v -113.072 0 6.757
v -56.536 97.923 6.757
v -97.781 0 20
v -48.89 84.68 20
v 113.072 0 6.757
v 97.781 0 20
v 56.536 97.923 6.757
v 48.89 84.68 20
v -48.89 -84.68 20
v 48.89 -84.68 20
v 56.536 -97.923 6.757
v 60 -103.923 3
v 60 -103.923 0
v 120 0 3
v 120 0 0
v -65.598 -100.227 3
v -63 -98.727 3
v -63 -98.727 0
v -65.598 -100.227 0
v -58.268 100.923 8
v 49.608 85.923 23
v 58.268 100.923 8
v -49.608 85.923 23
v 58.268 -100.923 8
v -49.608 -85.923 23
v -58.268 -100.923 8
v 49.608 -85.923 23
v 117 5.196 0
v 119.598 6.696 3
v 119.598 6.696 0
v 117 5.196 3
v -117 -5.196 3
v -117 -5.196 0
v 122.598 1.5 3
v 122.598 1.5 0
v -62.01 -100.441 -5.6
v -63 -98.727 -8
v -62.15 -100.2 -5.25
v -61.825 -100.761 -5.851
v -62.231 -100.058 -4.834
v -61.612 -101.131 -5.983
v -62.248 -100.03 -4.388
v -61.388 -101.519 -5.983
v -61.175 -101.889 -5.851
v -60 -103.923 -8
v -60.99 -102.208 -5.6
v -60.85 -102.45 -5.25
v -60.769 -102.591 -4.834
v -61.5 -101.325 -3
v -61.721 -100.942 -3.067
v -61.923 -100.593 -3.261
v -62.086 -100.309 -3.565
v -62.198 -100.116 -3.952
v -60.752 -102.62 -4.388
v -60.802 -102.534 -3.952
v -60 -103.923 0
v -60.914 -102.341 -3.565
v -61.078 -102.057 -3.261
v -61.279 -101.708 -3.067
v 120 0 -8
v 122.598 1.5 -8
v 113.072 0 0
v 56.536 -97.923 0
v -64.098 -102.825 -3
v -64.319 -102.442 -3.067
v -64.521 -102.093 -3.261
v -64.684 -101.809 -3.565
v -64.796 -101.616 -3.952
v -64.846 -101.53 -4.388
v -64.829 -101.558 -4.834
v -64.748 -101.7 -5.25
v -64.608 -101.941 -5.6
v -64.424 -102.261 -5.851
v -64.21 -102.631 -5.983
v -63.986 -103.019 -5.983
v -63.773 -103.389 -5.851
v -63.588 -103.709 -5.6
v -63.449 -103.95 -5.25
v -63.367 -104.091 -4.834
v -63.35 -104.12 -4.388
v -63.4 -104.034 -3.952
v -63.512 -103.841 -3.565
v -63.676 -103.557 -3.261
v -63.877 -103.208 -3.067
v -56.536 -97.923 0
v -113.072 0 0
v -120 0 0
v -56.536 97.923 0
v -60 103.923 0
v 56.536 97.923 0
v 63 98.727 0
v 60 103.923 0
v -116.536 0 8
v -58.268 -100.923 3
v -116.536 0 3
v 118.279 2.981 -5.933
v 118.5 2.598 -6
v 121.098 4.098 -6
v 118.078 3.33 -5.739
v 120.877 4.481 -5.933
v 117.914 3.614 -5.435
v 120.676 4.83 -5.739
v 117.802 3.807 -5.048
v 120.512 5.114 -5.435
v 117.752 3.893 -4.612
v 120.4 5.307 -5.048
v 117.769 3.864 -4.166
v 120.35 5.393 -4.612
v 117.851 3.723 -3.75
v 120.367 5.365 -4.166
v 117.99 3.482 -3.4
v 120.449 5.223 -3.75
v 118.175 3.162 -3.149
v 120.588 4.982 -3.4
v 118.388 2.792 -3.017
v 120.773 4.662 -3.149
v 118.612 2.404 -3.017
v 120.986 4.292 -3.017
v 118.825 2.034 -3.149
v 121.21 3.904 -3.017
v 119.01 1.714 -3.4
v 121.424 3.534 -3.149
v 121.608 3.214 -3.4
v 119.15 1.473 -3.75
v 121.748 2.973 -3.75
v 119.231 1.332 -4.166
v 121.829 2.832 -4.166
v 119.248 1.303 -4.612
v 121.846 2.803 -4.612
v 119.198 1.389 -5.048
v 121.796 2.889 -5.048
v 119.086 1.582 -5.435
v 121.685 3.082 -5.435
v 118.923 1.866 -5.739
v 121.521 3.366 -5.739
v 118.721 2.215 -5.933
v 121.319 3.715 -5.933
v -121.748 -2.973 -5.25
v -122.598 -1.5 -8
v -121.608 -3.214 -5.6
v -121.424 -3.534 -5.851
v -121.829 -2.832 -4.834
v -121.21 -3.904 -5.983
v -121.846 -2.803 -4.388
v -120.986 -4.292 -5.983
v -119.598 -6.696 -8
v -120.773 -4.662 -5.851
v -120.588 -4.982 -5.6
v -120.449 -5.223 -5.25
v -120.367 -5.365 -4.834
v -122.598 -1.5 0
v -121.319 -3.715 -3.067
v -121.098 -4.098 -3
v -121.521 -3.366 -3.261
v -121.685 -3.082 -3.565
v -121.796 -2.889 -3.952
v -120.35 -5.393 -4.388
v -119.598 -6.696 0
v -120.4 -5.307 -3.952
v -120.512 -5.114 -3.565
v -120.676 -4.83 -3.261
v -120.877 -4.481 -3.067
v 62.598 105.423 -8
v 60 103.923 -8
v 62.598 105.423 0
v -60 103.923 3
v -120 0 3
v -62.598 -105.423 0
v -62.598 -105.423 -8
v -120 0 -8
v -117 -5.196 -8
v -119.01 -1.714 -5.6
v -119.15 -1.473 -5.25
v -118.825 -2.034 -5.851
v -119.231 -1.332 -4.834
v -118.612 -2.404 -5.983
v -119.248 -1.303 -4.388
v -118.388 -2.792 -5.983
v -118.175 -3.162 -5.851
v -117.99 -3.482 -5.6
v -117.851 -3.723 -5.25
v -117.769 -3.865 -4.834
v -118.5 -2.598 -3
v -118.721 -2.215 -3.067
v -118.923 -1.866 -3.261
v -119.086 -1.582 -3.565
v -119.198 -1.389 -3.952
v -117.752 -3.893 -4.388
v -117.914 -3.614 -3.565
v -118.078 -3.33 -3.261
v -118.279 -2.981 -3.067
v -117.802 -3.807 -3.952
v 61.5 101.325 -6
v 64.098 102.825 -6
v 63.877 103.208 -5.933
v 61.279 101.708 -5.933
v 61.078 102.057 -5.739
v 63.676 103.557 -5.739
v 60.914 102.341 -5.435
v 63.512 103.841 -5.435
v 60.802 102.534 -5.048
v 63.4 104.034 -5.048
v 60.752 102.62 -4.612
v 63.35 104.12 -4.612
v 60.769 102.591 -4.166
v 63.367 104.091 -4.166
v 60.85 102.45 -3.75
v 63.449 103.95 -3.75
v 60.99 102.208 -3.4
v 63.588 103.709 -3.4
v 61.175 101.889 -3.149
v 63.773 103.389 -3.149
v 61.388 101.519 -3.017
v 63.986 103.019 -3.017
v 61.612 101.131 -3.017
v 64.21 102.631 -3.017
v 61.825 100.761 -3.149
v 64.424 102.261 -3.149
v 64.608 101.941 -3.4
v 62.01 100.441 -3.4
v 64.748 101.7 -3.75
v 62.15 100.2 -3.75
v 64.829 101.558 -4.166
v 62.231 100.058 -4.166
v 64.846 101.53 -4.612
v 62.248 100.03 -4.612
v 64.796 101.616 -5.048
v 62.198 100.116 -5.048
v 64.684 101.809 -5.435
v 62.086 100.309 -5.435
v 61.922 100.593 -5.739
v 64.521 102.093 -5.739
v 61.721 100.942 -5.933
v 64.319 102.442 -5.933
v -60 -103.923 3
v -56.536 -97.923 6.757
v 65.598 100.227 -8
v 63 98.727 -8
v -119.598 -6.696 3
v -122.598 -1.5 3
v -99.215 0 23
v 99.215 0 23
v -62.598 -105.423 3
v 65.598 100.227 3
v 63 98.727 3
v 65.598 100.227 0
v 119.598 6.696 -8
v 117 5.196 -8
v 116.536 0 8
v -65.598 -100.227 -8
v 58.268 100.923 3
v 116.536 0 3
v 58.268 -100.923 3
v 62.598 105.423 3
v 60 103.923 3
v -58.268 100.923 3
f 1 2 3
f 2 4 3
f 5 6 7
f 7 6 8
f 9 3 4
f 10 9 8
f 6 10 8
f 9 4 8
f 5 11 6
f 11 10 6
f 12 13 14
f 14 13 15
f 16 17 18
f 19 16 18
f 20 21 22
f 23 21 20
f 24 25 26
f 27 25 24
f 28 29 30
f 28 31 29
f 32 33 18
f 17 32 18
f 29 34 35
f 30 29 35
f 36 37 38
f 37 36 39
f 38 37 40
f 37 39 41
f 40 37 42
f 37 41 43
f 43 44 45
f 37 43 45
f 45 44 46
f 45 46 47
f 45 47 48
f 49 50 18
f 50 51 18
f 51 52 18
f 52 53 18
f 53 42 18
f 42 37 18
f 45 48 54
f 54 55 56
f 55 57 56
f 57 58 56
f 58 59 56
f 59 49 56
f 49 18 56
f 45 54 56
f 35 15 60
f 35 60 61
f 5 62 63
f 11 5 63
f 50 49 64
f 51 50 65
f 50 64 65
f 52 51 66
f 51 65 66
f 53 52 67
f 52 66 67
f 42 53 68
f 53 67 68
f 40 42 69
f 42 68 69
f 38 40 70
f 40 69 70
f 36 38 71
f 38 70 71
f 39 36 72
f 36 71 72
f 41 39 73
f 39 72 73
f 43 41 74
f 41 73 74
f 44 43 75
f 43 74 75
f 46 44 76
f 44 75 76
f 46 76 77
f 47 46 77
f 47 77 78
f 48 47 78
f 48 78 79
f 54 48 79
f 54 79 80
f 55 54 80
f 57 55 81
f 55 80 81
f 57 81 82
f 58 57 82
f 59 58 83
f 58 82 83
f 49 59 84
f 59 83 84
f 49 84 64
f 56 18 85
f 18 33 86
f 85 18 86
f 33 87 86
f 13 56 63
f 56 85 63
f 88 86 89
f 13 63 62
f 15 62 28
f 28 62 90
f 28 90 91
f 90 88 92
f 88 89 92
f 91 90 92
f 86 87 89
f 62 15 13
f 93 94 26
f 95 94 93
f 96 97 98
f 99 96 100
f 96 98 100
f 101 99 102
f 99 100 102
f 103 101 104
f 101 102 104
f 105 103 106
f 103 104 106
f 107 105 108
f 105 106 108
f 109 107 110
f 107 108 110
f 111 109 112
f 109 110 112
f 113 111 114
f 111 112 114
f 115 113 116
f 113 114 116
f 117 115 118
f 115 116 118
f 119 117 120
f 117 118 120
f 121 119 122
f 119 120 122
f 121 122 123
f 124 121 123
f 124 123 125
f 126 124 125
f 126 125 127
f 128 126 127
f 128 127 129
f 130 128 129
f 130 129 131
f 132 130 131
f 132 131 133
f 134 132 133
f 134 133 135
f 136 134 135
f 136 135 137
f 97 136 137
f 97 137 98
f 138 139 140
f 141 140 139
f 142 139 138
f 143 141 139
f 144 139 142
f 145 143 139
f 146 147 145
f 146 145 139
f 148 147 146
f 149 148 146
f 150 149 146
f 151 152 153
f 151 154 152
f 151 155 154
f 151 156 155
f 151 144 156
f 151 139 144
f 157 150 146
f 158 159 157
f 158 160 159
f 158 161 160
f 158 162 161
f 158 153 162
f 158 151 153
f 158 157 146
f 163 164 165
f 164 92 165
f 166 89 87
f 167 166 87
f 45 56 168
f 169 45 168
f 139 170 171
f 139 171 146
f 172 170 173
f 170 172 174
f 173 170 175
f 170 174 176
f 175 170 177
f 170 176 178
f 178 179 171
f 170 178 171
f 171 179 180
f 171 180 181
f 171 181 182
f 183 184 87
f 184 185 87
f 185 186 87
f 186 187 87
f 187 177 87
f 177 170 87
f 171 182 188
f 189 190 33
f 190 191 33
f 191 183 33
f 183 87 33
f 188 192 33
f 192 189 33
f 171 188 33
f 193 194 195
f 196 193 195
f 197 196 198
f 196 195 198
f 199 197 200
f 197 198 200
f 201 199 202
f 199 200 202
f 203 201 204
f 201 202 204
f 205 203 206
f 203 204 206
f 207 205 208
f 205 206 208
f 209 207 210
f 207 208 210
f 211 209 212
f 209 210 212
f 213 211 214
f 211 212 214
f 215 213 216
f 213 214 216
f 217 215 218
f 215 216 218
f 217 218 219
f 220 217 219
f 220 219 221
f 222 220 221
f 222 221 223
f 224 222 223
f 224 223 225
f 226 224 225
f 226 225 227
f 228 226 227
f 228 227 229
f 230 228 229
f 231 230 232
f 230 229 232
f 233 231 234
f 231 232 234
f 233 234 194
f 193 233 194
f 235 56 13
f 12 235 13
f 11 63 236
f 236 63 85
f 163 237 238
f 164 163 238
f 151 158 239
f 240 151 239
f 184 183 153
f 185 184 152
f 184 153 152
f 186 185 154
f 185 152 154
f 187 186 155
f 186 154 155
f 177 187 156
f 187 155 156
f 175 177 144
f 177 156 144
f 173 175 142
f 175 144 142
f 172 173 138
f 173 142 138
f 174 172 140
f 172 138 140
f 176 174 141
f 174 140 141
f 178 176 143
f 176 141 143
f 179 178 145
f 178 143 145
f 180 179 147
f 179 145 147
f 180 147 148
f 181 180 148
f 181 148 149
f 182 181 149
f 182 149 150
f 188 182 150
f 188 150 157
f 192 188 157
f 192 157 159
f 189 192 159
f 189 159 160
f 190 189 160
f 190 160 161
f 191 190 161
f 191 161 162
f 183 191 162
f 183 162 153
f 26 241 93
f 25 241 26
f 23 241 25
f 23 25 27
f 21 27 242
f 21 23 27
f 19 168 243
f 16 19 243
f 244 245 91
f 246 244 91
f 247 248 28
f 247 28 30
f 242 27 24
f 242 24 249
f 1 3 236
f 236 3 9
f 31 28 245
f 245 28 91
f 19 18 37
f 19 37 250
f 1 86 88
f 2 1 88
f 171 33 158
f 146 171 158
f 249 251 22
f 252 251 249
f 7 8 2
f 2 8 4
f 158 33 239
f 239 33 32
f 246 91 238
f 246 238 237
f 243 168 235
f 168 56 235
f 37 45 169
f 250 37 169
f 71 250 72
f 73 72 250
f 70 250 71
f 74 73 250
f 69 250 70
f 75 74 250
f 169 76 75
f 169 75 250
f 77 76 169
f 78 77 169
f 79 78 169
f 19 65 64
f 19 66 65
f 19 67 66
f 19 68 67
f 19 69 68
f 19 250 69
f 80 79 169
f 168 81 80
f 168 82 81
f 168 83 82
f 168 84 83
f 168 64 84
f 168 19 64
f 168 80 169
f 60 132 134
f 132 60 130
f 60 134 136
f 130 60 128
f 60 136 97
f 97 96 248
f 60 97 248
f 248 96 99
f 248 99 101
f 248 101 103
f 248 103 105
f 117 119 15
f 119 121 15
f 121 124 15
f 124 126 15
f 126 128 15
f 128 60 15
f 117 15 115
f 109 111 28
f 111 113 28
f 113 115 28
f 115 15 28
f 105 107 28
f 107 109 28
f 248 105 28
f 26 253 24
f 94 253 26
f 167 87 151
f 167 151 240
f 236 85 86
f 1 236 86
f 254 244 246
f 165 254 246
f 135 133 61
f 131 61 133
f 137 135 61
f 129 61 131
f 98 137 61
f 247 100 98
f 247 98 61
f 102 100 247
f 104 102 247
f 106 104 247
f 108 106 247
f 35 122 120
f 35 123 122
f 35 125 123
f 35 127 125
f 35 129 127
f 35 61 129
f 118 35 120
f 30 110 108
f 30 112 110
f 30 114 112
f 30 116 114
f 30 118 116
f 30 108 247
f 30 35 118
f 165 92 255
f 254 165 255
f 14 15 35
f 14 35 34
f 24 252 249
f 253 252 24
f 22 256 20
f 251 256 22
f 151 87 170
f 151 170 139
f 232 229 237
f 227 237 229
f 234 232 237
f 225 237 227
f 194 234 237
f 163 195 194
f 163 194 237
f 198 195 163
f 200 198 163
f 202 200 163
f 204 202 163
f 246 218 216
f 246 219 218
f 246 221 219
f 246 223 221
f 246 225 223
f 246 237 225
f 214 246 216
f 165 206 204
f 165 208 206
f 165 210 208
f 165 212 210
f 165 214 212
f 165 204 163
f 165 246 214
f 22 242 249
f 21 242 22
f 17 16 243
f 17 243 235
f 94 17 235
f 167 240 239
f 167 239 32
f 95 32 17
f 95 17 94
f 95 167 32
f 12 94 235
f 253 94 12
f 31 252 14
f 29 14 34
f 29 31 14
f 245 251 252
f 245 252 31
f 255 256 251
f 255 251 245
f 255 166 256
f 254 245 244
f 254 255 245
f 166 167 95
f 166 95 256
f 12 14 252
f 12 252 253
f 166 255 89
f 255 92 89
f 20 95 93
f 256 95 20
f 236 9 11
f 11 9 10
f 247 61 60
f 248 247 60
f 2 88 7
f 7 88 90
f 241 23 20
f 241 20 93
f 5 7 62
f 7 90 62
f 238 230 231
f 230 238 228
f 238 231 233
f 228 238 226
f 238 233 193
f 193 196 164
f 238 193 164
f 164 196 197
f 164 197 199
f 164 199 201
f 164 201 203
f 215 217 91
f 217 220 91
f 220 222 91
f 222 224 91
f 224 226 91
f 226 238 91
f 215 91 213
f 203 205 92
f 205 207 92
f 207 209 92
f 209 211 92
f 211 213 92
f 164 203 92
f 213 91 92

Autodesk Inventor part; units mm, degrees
ref_plane "YZ Plane" through (0, 0, 0) normal (1, 0, 0) x (0, 1, 0)
ref_plane "XZ Plane" through (0, 0, 0) normal (0, 1, 0) x (-1, 0, 0)
ref_plane "XY Plane" through (0, 0, 0) normal (0, 0, 1) x (1, 0, 0)
ref_plane "Plano de trabajo1" through (0, 0, 0) normal (0, 0, 1) x (1, 0, 0)
sketch "Boceto1" plane through (0, 0, 0) normal (0, 0, 1) x (1, 0, 0)
  line L0 (58.8453, 101.923) -> (-58.8453, 101.923) projected
  line L1 (-58.8453, 101.923) -> (-117.6906, 0) projected
  line L2 (-117.6906, 0) -> (-58.8453, -101.923) projected
  line L3 (-58.8453, -101.923) -> (58.8453, -101.923) projected
  line L4 (58.8453, -101.923) -> (117.6906, 0) projected
  line L5 (117.6906, 0) -> (58.8453, 101.923) projected
  line L6 (-60, 103.923) -> (-120, 0) projected
  line L7 (-120, 0) -> (-60, -103.923) projected
  line L8 (-60, -103.923) -> (60, -103.923) projected
  line L9 (60, -103.923) -> (120, 0) projected
  line L10 (120, 0) -> (60, 103.923) projected
  line L11 (60, 103.923) -> (-60, 103.923) projected
  line L12 (58.8453, 101.923) -> (117.6906, 0) projected
  line L13 (117.6906, 0) -> (58.8453, -101.923) projected
  line L14 (58.8453, -101.923) -> (-58.8453, -101.923) projected
  line L15 (-58.8453, -101.923) -> (-117.6906, 0) projected
  line L16 (-117.6906, 0) -> (-58.8453, 101.923) projected
  line L17 (-58.8453, 101.923) -> (58.8453, 101.923) projected
  point P0 (0, 0)
extrude "Extrusión1" add sketch "Boceto1" along normal blind 3 contours L5 L4 L3 L2 L1 L0 | L11 L10 L9 L8 L7 L6
sketch "Boceto2" plane through (0, 0, 3) normal (0, 0, 1) x (1, 0, 0)
  line L0 (-120, 0) -> (-60, -103.923) projected
  line L1 (-60, -103.923) -> (60, -103.923) projected
  line L2 (60, -103.923) -> (120, 0) projected
  line L3 (120, 0) -> (60, 103.923) projected
  line L4 (60, 103.923) -> (-60, 103.923) projected
  line L5 (-60, 103.923) -> (-120, 0) projected
  line L6 (58.2679, 100.923) -> (116.5359, 0)
  line L7 (116.5359, 0) -> (58.2679, -100.923)
  line L8 (58.2679, -100.923) -> (-58.2679, -100.923)
  line L9 (-58.2679, -100.923) -> (-116.5359, 0)
  line L10 (-116.5359, 0) -> (-58.2679, 100.923)
  line L11 (-58.2679, 100.923) -> (58.2679, 100.923)
  point P0 (0, 0)
  dimension "d2" = 3
extrude "Extrusión2" add sketch "Boceto2" along normal blind 20 contours L6 L7 L8 L9 L10 L11
chamfer "Chaflán1" distance 15 angle 45 6 edges at (-87.4019, 50.4615, 23) (-87.4019, -50.4615, 23) (0, -100.923, 23) (87.4019, -50.4615, 23) (87.4019, 50.4615, 23) (0, 100.923, 23)
sketch "Boceto3" plane through (0, 0, 0) normal (0, 0, -1) x (-1, 0, 0)
  line L0 (117.6906, 0) -> (58.8453, -101.923) projected
  line L1 (58.8453, -101.923) -> (-58.8453, -101.923) projected
  line L2 (58.8453, 101.923) -> (117.6906, 0) projected
  line L3 (-117.6906, 0) -> (-58.8453, 101.923) projected
  line L4 (-58.8453, -101.923) -> (-117.6906, 0) projected
  point P0 (0, 0)
shell "Vaciado1" thickness 3 removed faces 1 at (-20, 34.641, 0)
sketch "Boceto4" plane through (-60, -103.923, 0) normal (-0.866, -0.5, 0) x (0, 0, 1)
  line L0 (0, 120) -> (0, 0) projected
  line L1 (0, 0) -> (3, 0) projected
  line L2 (3, 120) -> (3, 0) projected
  line L3 (0, 120) -> (3, 120) projected
  line L4 (0, 120) -> (3, 120) projected
  line L5 (0, 0) -> (0, 120) projected
  line L6 (3, 120) -> (0, 120)
  line L7 (0, 120) -> (0, 114)
  line L8 (0, 114) -> (3, 114)
  line L9 (3, 114) -> (3, 120)
  line L10 (0, 0) -> (3, 0)
  line L11 (3, 0) -> (3, 6)
  line L12 (3, 6) -> (0, 6)
  line L13 (0, 6) -> (0, 0)
  point P0 (0, 60)
  point P1 (0, 114)
  point P2 (3, 114)
  point P3 (0, 6)
  dimension "d9" = 6
  dimension "d10" = 6
extrude "Extrusión3" add sketch "Boceto4" along normal blind 3 contours L3 L2 L8 L0 | L12 L2 L1 L0
sketch "Boceto5" plane through (0, 0, 0) normal (0, 0, -1) x (-1, 0, 0)
  line L0 (-56.5359, 97.923) -> (56.5359, 97.923) projected
  line L1 (56.5359, 97.923) -> (113.0718, 0) projected
  line L2 (113.0718, 0) -> (56.5359, -97.923) projected
  line L3 (56.5359, -97.923) -> (-56.5359, -97.923) projected
  line L4 (-56.5359, -97.923) -> (-113.0718, 0) projected
  line L5 (-113.0718, 0) -> (-56.5359, 97.923) projected
  line L6 (60, 103.923) -> (120, 0) projected
  line L7 (-60, 103.923) -> (60, 103.923) projected
  line L8 (-120, 0) -> (-60, 103.923) projected
  line L9 (-60, -103.923) -> (-120, 0) projected
  line L10 (60, -103.923) -> (-60, -103.923) projected
  line L11 (60, -103.923) -> (62.5981, -105.423) projected
  line L12 (65.5981, -100.2269) -> (62.5981, -105.423) projected
  line L13 (63, -98.7269) -> (65.5981, -100.2269) projected
  line L14 (117, -5.1962) -> (63, -98.7269) projected
  line L15 (117, -5.1962) -> (119.5981, -6.6962) projected
  line L16 (122.5981, -1.5) -> (119.5981, -6.6962) projected
  line L17 (120, 0) -> (122.5981, -1.5) projected
  line L18 (120, 0) -> (117, -5.1962)
  line L19 (63, -98.7269) -> (60, -103.923)
  point P0 (0, 0)
extrude "Extrusión4" add sketch "Boceto5" along normal blind 8 contours L17 L16 L15 L18 | L13 L12 L11 L19
sketch "Boceto6" plane through (-62.5981, -105.423, 0) normal (-0.866, -0.5, 0) x (0, 0, 1)
  line L0 (3, 114) -> (-8, 114) projected
  line L1 (-8, 114) -> (-8, 117)
  line L2 (-8, 114) -> (-8, 120) projected
  line L3 (-8, 117) -> (-4.5, 117)
  circle A0 centre (-4.5, 117) radius 1.5
  line L4 (-8, 6) -> (-8, 0) projected
  line L5 (-8, 6) -> (-8, 3)
  line L6 (-8, 3) -> (-4.5, 3)
  circle A1 centre (-4.5, 3) radius 1.5
  point P0 (0, 60)
  dimension "d15" = 3.5
  dimension "d16" = 3
  dimension "d17" = 3.5
  dimension "d18" = 3
extrude "Extrusión5" cut sketch "Boceto6" against normal blind 8
sketch "Boceto7" plane through (60, 103.923, 3) normal (0.866, 0.5, 0) x (0, 0, -1)
  line L0 (3, -120) -> (3, 0) projected
  line L1 (3, 0) -> (0, 0) projected
  line L2 (0, -120) -> (0, 0) projected
  line L3 (3, -120) -> (0, -120) projected
  line L4 (3, -120) -> (0, -120)
  line L5 (0, -120) -> (0, -114)
  line L6 (0, -114) -> (3, -114)
  line L7 (3, -114) -> (3, -120)
  line L8 (3, 0) -> (0, 0)
  line L9 (0, 0) -> (0, -6)
  line L10 (0, -6) -> (3, -6)
  line L11 (3, -6) -> (3, 0)
  point P0 (3, -60)
  point P1 (3, -114)
  point P2 (3, -6)
  dimension "d21" = 6
  dimension "d22" = 6
extrude "Extrusión6" add sketch "Boceto7" along normal blind 3 contours L3 L2 L6 L0 | L10 L2 L1 L0
sketch "Boceto8" plane through (0, 0, 0) normal (0, 0, -1) x (-1, 0, 0)
  line L0 (-56.5359, 97.923) -> (56.5359, 97.923) projected
  line L1 (56.5359, 97.923) -> (113.0718, 0) projected
  line L2 (113.0718, 0) -> (56.5359, -97.923) projected
  line L3 (56.5359, -97.923) -> (-56.5359, -97.923) projected
  line L4 (-56.5359, -97.923) -> (-113.0718, 0) projected
  line L5 (-113.0718, 0) -> (-56.5359, 97.923) projected
  line L6 (60, -103.923) -> (63, -98.7269) projected
  line L7 (117, -5.1962) -> (63, -98.7269) projected
  line L8 (117, -5.1962) -> (120, 0) projected
  line L9 (60, 103.923) -> (120, 0) projected
  line L10 (-60, 103.923) -> (60, 103.923) projected
  line L11 (-60, 103.923) -> (-62.5981, 105.423) projected
  line L12 (-65.5981, 100.2269) -> (-62.5981, 105.423) projected
  line L13 (-63, 98.7269) -> (-65.5981, 100.2269) projected
  line L14 (-117, 5.1962) -> (-63, 98.7269) projected
  line L15 (-117, 5.1962) -> (-119.5981, 6.6962) projected
  line L16 (-122.5981, 1.5) -> (-119.5981, 6.6962) projected
  line L17 (-120, 0) -> (-122.5981, 1.5) projected
  line L18 (-60, -103.923) -> (-120, 0) projected
  line L19 (60, -103.923) -> (-60, -103.923) projected
  line L20 (-120, 0) -> (-60, 103.923)
  point P0 (0, 0)
  point P1 (-63, 98.7269)
  point P2 (-117, 5.1962)
extrude "Extrusión7" add sketch "Boceto8" along normal blind 8 contours L17 L16 L15 L20 | L13 L12 L11 L20
sketch "Boceto9" plane through (62.5981, 105.423, 3) normal (0.866, 0.5, 0) x (0, 0, -1)
  circle A0 centre (7.5, -117) radius 1.5 projected
  circle A1 centre (7.5, -3) radius 1.5 projected
  point P0 (3, -60)
extrude "Extrusión8" cut sketch "Boceto9" against normal blind 8
properties part number "tapaHEX"
